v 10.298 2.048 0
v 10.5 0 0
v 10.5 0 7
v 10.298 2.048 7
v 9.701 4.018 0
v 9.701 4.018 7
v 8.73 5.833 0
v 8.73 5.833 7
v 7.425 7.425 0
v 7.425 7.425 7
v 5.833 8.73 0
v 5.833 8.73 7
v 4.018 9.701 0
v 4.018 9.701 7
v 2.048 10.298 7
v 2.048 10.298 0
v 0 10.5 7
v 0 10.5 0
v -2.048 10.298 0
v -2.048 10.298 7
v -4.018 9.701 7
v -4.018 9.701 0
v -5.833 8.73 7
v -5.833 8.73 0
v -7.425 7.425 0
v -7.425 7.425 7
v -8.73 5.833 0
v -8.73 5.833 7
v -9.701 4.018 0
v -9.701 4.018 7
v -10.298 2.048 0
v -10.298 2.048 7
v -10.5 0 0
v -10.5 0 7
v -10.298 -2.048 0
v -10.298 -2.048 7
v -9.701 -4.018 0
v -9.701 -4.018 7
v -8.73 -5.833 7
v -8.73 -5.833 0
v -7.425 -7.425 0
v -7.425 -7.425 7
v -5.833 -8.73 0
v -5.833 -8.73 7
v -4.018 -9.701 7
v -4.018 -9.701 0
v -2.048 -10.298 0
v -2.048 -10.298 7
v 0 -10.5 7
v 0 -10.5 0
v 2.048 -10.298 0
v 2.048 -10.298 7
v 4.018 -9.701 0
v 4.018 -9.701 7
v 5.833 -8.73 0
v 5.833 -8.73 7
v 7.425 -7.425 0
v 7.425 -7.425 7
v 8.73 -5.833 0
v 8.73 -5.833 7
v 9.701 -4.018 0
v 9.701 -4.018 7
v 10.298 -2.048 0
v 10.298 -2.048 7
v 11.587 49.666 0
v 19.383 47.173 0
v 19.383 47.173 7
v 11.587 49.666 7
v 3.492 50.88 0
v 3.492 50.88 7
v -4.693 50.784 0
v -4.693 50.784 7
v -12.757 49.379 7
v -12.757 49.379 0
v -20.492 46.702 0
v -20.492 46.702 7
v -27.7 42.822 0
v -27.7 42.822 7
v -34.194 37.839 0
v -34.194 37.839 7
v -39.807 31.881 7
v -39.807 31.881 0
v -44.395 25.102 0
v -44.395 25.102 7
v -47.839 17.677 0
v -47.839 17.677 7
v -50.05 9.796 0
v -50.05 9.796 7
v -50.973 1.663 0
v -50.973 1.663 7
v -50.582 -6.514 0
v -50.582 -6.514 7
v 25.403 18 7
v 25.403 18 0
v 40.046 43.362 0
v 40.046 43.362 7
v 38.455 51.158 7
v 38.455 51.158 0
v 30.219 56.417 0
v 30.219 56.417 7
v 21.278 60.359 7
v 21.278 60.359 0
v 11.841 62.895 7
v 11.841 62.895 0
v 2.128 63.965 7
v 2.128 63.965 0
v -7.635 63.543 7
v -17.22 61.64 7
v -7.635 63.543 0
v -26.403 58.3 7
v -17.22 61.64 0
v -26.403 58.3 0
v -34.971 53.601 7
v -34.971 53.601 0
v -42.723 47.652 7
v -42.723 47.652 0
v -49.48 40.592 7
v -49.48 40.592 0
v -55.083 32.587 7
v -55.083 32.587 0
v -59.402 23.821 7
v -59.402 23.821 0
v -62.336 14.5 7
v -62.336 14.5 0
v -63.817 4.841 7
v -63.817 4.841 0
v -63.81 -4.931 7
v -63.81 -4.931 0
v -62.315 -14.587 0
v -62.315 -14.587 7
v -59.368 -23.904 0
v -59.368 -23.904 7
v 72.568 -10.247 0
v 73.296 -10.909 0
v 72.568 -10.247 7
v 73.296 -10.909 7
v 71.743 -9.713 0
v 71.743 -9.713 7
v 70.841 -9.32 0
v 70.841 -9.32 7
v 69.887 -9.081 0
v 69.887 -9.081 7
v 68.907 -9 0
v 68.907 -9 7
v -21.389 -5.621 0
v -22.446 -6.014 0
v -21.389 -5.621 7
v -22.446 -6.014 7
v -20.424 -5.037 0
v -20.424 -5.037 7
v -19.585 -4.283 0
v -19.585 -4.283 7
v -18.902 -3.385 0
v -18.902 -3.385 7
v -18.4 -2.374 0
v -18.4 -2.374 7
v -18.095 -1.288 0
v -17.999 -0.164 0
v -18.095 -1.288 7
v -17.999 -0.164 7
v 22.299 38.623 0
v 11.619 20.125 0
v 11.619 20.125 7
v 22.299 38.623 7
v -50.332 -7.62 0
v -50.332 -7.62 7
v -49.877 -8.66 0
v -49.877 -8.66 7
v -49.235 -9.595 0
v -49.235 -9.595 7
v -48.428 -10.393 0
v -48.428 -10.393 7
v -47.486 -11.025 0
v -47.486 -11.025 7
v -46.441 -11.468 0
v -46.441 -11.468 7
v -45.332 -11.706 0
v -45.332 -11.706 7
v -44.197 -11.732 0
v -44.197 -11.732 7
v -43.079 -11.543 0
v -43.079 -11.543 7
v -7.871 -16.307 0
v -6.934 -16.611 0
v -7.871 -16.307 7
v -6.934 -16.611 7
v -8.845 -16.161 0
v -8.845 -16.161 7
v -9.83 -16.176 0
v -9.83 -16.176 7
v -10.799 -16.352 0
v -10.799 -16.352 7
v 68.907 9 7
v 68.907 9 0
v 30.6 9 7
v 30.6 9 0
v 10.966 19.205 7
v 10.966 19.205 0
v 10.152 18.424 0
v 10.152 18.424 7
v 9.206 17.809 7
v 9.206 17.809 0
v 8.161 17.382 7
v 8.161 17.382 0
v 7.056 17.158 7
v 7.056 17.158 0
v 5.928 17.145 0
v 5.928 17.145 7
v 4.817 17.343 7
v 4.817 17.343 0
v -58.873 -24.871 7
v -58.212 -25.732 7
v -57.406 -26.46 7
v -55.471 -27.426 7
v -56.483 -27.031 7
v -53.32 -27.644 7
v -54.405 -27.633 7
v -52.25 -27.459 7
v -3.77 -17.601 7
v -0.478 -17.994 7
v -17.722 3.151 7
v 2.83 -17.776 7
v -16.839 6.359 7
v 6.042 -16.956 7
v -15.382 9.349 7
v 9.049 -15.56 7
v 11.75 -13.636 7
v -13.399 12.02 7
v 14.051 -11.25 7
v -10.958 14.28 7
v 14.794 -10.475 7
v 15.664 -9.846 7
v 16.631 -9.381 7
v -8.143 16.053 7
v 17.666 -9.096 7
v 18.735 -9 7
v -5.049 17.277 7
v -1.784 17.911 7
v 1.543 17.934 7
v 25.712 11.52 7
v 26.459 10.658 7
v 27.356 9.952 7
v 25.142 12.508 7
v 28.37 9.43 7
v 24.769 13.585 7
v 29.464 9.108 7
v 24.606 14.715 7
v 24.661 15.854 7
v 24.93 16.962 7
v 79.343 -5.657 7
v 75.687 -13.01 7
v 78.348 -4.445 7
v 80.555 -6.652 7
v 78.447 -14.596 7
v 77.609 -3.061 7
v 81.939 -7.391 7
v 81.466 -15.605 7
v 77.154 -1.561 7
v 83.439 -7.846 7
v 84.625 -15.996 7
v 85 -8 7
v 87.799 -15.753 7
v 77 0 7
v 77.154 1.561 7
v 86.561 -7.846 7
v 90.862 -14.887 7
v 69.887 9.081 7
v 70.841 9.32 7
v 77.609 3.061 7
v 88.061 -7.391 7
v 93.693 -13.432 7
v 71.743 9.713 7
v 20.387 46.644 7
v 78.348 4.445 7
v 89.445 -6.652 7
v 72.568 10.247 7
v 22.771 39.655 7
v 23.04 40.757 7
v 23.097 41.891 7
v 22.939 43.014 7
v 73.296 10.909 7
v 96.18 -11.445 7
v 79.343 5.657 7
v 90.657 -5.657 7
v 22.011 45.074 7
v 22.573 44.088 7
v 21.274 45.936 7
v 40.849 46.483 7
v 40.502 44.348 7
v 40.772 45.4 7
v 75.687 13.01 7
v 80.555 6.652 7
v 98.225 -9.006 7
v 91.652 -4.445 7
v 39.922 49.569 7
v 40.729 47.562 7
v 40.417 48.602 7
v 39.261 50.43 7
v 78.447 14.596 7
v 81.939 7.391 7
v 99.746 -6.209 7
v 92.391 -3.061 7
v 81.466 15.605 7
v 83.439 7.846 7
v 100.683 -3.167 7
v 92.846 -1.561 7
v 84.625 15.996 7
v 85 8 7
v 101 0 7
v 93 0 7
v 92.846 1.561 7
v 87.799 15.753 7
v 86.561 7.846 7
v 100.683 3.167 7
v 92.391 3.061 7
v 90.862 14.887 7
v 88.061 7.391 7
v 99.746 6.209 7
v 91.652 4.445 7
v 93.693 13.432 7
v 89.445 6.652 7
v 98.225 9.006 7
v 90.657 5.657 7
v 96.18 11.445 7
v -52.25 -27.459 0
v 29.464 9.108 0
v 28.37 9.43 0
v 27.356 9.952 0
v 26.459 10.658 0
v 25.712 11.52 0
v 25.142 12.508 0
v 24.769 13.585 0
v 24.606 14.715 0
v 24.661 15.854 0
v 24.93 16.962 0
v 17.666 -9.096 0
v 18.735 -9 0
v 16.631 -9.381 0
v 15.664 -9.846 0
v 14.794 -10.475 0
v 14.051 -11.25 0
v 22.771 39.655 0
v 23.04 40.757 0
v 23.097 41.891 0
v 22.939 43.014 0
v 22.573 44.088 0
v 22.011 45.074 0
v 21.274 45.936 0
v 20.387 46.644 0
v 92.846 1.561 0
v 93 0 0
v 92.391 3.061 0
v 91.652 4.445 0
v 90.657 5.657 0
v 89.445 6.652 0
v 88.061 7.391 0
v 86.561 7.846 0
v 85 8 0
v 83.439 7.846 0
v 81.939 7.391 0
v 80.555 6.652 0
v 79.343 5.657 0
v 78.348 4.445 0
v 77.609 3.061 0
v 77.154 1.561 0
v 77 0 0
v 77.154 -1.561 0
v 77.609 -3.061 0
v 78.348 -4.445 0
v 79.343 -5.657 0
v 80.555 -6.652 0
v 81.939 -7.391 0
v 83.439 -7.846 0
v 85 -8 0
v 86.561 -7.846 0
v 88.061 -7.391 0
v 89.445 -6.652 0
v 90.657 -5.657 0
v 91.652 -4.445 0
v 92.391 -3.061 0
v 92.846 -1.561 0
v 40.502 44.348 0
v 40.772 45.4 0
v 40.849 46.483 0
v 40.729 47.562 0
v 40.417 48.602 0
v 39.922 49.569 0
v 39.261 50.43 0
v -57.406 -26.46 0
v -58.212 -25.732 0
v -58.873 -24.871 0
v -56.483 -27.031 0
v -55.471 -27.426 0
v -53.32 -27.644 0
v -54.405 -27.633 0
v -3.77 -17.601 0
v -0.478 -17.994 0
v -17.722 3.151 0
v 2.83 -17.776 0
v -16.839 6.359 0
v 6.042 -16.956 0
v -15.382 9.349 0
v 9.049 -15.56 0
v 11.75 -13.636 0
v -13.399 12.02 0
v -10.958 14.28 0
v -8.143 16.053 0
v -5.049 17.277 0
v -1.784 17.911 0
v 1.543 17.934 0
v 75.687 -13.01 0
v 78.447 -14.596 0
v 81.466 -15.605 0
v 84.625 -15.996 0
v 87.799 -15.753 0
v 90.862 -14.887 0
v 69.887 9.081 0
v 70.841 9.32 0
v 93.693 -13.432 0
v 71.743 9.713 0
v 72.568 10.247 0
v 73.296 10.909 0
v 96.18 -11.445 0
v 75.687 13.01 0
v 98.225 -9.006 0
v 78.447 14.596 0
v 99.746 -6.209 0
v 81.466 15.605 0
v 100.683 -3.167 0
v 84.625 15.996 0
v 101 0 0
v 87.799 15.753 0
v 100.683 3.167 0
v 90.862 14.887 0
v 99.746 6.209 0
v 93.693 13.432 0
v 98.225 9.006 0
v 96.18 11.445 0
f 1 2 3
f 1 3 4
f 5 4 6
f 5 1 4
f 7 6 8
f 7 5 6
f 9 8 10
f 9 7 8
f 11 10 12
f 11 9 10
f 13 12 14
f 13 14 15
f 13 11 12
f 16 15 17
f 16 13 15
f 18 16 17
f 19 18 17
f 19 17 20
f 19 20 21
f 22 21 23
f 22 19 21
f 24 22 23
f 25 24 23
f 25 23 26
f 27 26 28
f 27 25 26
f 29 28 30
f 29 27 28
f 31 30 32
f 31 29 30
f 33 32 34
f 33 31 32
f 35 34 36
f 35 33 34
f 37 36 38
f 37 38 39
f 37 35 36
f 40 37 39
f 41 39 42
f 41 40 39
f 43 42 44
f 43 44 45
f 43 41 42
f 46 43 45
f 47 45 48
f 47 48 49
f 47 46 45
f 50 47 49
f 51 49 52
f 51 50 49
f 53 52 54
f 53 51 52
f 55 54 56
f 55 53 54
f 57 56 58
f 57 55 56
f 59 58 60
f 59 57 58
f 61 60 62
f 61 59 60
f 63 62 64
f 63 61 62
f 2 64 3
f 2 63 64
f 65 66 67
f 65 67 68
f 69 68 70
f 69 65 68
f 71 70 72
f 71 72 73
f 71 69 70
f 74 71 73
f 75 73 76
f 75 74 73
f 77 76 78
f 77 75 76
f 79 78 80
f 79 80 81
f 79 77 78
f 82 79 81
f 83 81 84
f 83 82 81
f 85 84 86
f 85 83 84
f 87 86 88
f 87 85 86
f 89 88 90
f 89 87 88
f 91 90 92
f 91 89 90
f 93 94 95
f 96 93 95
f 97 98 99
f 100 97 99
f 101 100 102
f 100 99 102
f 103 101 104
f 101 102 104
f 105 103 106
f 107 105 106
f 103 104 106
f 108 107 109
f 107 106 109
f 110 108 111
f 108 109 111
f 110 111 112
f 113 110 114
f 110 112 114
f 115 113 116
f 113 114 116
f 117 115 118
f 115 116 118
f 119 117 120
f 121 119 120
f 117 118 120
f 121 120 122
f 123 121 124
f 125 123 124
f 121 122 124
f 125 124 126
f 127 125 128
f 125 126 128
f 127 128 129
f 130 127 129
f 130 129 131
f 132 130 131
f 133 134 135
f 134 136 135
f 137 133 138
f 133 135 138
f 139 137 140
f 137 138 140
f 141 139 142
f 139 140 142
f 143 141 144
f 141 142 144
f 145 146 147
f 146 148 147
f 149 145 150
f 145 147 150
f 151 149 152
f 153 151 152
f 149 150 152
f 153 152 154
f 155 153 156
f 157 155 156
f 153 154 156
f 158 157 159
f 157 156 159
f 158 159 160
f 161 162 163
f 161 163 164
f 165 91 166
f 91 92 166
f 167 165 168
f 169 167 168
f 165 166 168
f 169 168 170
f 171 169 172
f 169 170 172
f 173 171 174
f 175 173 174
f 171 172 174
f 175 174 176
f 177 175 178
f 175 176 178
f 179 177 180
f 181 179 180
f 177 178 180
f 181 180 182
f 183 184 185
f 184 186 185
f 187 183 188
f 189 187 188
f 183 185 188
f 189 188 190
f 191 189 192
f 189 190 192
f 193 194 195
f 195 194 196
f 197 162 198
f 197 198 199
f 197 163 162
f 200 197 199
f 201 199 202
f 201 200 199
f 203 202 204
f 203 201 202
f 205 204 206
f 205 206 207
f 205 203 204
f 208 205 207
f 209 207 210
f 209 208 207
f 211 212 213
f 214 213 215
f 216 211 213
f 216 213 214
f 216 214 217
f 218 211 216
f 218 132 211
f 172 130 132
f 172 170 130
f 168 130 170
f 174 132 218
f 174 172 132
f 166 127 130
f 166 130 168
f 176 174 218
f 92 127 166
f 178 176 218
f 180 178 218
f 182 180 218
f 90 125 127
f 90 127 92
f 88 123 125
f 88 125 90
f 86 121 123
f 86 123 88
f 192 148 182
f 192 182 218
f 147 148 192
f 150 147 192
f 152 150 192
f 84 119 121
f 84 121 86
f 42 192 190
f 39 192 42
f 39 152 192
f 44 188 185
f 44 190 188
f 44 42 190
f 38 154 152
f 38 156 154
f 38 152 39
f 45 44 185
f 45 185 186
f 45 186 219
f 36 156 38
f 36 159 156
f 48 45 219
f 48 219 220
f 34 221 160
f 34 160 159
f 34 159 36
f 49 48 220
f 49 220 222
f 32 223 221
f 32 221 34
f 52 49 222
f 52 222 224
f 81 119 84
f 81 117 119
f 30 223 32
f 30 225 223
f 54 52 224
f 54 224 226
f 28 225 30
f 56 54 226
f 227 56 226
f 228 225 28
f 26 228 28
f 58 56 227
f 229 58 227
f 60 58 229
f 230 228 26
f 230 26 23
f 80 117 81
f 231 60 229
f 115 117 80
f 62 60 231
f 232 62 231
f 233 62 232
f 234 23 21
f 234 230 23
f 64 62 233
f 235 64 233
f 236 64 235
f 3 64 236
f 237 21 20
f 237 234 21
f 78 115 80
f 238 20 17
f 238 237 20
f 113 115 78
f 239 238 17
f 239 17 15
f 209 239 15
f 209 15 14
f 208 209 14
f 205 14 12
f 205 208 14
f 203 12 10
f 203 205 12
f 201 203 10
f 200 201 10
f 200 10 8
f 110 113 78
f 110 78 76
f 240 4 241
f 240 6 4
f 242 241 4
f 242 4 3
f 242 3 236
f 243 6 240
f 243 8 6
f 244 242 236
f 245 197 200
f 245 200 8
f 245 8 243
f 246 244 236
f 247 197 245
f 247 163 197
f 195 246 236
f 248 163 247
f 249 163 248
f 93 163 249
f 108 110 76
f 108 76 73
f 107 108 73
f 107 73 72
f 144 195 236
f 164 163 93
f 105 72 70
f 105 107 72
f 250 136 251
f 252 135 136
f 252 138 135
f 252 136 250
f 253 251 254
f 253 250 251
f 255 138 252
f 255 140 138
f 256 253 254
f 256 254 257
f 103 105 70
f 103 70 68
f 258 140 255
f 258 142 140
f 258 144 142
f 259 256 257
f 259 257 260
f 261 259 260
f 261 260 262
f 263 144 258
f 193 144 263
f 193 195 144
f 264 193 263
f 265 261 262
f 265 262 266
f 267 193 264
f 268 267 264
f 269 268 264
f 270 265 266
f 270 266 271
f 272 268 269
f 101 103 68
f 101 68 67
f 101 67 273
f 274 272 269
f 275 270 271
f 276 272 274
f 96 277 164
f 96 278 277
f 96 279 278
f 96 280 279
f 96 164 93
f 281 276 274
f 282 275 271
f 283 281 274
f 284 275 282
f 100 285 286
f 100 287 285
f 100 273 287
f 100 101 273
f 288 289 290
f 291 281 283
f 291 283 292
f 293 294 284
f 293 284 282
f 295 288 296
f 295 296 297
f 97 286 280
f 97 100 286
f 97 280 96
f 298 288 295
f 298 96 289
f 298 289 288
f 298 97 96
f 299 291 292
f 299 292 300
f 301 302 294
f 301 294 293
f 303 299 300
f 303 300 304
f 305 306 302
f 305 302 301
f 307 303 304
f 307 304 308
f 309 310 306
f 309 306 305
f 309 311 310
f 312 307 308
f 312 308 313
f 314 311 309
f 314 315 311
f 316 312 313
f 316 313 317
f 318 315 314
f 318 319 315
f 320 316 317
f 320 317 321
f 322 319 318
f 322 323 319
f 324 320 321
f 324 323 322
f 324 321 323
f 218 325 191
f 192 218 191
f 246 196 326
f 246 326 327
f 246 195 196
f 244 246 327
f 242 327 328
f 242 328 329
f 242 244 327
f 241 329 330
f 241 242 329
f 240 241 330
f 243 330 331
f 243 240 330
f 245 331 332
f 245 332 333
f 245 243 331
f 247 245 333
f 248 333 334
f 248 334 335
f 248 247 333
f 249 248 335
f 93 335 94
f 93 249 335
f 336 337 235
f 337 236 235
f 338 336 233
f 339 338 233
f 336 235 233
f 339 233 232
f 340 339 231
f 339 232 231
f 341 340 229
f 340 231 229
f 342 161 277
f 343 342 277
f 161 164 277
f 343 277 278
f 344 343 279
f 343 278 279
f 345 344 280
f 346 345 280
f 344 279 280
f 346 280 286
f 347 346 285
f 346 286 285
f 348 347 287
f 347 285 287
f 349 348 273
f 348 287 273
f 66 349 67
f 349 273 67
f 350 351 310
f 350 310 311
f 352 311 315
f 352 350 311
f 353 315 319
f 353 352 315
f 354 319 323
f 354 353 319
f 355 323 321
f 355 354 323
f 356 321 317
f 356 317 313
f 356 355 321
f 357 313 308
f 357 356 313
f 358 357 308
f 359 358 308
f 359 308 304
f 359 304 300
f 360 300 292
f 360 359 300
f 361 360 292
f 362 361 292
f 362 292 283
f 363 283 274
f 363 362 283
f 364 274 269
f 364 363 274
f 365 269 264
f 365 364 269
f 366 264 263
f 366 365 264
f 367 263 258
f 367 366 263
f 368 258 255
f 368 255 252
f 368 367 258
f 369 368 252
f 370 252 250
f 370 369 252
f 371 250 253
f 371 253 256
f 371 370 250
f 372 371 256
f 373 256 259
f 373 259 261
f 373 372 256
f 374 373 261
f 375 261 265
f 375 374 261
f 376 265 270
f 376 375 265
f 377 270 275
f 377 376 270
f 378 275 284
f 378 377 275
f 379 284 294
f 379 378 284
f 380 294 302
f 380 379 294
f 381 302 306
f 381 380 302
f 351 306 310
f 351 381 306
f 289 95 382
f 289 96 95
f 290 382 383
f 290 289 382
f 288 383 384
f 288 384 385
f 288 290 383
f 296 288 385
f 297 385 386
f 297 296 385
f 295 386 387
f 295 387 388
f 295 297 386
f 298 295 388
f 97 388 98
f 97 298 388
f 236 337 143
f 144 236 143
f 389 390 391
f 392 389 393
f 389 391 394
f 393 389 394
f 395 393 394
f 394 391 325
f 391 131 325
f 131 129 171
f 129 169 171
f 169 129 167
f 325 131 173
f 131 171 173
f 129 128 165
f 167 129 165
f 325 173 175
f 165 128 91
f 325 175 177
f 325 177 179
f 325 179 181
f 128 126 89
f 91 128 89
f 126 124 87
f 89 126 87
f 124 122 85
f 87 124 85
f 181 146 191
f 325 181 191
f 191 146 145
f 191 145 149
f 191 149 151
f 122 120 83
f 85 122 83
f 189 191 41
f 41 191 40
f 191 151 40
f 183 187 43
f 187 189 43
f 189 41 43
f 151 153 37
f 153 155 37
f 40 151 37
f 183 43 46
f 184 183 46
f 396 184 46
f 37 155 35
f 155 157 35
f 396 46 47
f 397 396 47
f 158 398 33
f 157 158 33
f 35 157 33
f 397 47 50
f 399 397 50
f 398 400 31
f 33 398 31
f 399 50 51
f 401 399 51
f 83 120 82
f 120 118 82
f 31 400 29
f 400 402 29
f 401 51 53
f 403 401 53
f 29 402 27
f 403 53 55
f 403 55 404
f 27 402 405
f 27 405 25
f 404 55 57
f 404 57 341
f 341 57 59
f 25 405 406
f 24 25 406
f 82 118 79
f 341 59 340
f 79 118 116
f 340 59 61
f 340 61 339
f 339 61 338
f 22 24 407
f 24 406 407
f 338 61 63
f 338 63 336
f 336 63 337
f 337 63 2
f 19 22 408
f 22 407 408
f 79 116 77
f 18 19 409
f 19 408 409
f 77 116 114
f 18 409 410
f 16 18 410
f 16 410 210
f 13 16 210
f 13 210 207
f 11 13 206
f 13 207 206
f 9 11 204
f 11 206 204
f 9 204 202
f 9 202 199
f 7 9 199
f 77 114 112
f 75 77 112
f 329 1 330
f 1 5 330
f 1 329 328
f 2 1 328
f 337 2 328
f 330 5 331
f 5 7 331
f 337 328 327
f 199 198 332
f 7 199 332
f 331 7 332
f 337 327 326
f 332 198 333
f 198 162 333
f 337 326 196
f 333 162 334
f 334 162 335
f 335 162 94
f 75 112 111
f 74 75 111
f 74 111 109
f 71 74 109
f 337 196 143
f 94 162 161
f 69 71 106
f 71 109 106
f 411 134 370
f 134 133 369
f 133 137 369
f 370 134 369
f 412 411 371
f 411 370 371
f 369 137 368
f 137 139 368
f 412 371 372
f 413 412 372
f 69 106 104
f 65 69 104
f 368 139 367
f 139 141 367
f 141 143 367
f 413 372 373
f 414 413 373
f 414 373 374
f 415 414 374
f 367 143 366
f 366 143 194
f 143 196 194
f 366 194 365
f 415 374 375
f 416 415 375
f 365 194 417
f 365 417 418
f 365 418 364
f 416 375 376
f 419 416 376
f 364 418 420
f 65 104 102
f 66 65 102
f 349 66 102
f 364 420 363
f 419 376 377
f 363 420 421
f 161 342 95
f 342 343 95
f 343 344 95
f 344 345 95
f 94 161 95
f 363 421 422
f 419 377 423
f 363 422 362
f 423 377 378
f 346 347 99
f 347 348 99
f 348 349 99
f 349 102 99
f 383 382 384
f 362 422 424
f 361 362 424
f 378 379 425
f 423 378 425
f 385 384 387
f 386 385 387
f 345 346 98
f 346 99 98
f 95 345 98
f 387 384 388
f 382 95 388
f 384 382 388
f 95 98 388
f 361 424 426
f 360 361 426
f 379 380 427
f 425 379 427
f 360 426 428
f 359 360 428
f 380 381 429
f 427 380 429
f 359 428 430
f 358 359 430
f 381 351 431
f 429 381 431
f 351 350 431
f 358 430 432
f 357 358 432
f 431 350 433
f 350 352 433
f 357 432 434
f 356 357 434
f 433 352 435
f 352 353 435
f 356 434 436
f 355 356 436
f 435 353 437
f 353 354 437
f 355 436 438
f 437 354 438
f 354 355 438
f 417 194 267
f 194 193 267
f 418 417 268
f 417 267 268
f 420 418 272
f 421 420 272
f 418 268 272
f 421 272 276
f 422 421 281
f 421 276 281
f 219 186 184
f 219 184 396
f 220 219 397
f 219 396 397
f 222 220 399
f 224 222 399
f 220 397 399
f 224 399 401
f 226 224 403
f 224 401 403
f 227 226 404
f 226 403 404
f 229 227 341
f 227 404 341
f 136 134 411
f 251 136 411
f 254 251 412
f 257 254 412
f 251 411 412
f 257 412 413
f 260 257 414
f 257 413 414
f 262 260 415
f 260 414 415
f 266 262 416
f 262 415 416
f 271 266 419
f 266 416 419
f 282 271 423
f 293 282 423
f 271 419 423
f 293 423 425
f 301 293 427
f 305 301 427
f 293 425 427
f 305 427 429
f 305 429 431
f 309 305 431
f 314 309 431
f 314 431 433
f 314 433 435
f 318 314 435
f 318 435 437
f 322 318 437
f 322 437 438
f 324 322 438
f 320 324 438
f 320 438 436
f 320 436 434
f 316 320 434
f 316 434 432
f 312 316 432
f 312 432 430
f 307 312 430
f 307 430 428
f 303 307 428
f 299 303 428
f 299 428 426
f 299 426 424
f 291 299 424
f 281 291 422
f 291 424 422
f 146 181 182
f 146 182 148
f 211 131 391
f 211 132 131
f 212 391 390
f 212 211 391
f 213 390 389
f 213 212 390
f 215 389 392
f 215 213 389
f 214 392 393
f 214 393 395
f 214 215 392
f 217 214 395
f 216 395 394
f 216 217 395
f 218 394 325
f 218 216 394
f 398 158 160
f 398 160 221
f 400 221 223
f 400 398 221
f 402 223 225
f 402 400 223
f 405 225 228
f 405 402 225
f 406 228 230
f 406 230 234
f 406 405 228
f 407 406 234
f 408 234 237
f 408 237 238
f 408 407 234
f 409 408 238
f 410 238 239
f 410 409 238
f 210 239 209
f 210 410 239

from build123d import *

# Parameters (mm, degrees)
SKETCH1_R           = 10.5
SKETCH1_R_2         = 8
BOSS_EXTRUDE2_DEPTH = 7
FILLET4_R           = 6
FILLET5_R           = 6


with BuildPart() as part:
    # Sketch1 → Boss-Extrude2 (new body)
    with BuildSketch(Plane.XY):
        with BuildLine():
            Line((71.771243445, 9), (20.207259422, 9))
            Line((20.207259422, 9), (42.591220317, 47.770157545))
            ThreePointArc((42.591220317, 47.770157545), (-38.960731457, 50.774613779), (-57.165847871, -28.776133117))
            Line((-57.165847871, -28.776133117), (-8.66103197, -15.779306867))
            ThreePointArc((-8.66103197, -15.779306867), (4.846344572, -17.335309178), (15.588457268, -9))
            Line((15.588457268, -9), (71.771243445, -9))
            ThreePointArc((71.771243445, -9), (101, 0), (71.771243445, 9))
        make_face()
        Circle(SKETCH1_R, mode=Mode.SUBTRACT)
        with Locations((85, 0)):
            Circle(SKETCH1_R_2, mode=Mode.SUBTRACT)
        with BuildLine():
            Line((9, 15.588457268), (25.5, 44.167295593))
            ThreePointArc((25.5, 44.167295593), (-31.046832879, 40.461020355), (-49.262217141, -13.1997713))
            Line((-49.262217141, -13.1997713), (-17.386664873, -4.658742812))
            ThreePointArc((-17.386664873, -4.658742812), (-10.957705722, 14.280360125), (9, 15.588457268))
        make_face(mode=Mode.SUBTRACT)
    extrude(amount=BOSS_EXTRUDE2_DEPTH)

    # Fillet4
    fillet4_edges = [part.edges().sort_by_distance(p)[0] for p in [
        (71.771243445, -9, 3.5),
        (15.588457268, -9, 3.5),
        (-8.66103197, -15.779306867, 3.5),
        (-57.165847871, -28.776133117, 3.5),
        (42.591220317, 47.770157545, 3.5),
        (20.207259422, 9, 3.5),
        (71.771243445, 9, 3.5),
    ]]
    fillet(fillet4_edges, radius=FILLET4_R)

    # Fillet5
    fillet5_edges = [part.edges().sort_by_distance(p)[0] for p in [
        (25.5, 44.167295593, 3.5),
        (-49.262217141, -13.1997713, 3.5),
        (-17.386664873, -4.658742812, 3.5),
        (9, 15.588457268, 3.5),
    ]]
    fillet(fillet5_edges, radius=FILLET5_R)


solid = part.part
